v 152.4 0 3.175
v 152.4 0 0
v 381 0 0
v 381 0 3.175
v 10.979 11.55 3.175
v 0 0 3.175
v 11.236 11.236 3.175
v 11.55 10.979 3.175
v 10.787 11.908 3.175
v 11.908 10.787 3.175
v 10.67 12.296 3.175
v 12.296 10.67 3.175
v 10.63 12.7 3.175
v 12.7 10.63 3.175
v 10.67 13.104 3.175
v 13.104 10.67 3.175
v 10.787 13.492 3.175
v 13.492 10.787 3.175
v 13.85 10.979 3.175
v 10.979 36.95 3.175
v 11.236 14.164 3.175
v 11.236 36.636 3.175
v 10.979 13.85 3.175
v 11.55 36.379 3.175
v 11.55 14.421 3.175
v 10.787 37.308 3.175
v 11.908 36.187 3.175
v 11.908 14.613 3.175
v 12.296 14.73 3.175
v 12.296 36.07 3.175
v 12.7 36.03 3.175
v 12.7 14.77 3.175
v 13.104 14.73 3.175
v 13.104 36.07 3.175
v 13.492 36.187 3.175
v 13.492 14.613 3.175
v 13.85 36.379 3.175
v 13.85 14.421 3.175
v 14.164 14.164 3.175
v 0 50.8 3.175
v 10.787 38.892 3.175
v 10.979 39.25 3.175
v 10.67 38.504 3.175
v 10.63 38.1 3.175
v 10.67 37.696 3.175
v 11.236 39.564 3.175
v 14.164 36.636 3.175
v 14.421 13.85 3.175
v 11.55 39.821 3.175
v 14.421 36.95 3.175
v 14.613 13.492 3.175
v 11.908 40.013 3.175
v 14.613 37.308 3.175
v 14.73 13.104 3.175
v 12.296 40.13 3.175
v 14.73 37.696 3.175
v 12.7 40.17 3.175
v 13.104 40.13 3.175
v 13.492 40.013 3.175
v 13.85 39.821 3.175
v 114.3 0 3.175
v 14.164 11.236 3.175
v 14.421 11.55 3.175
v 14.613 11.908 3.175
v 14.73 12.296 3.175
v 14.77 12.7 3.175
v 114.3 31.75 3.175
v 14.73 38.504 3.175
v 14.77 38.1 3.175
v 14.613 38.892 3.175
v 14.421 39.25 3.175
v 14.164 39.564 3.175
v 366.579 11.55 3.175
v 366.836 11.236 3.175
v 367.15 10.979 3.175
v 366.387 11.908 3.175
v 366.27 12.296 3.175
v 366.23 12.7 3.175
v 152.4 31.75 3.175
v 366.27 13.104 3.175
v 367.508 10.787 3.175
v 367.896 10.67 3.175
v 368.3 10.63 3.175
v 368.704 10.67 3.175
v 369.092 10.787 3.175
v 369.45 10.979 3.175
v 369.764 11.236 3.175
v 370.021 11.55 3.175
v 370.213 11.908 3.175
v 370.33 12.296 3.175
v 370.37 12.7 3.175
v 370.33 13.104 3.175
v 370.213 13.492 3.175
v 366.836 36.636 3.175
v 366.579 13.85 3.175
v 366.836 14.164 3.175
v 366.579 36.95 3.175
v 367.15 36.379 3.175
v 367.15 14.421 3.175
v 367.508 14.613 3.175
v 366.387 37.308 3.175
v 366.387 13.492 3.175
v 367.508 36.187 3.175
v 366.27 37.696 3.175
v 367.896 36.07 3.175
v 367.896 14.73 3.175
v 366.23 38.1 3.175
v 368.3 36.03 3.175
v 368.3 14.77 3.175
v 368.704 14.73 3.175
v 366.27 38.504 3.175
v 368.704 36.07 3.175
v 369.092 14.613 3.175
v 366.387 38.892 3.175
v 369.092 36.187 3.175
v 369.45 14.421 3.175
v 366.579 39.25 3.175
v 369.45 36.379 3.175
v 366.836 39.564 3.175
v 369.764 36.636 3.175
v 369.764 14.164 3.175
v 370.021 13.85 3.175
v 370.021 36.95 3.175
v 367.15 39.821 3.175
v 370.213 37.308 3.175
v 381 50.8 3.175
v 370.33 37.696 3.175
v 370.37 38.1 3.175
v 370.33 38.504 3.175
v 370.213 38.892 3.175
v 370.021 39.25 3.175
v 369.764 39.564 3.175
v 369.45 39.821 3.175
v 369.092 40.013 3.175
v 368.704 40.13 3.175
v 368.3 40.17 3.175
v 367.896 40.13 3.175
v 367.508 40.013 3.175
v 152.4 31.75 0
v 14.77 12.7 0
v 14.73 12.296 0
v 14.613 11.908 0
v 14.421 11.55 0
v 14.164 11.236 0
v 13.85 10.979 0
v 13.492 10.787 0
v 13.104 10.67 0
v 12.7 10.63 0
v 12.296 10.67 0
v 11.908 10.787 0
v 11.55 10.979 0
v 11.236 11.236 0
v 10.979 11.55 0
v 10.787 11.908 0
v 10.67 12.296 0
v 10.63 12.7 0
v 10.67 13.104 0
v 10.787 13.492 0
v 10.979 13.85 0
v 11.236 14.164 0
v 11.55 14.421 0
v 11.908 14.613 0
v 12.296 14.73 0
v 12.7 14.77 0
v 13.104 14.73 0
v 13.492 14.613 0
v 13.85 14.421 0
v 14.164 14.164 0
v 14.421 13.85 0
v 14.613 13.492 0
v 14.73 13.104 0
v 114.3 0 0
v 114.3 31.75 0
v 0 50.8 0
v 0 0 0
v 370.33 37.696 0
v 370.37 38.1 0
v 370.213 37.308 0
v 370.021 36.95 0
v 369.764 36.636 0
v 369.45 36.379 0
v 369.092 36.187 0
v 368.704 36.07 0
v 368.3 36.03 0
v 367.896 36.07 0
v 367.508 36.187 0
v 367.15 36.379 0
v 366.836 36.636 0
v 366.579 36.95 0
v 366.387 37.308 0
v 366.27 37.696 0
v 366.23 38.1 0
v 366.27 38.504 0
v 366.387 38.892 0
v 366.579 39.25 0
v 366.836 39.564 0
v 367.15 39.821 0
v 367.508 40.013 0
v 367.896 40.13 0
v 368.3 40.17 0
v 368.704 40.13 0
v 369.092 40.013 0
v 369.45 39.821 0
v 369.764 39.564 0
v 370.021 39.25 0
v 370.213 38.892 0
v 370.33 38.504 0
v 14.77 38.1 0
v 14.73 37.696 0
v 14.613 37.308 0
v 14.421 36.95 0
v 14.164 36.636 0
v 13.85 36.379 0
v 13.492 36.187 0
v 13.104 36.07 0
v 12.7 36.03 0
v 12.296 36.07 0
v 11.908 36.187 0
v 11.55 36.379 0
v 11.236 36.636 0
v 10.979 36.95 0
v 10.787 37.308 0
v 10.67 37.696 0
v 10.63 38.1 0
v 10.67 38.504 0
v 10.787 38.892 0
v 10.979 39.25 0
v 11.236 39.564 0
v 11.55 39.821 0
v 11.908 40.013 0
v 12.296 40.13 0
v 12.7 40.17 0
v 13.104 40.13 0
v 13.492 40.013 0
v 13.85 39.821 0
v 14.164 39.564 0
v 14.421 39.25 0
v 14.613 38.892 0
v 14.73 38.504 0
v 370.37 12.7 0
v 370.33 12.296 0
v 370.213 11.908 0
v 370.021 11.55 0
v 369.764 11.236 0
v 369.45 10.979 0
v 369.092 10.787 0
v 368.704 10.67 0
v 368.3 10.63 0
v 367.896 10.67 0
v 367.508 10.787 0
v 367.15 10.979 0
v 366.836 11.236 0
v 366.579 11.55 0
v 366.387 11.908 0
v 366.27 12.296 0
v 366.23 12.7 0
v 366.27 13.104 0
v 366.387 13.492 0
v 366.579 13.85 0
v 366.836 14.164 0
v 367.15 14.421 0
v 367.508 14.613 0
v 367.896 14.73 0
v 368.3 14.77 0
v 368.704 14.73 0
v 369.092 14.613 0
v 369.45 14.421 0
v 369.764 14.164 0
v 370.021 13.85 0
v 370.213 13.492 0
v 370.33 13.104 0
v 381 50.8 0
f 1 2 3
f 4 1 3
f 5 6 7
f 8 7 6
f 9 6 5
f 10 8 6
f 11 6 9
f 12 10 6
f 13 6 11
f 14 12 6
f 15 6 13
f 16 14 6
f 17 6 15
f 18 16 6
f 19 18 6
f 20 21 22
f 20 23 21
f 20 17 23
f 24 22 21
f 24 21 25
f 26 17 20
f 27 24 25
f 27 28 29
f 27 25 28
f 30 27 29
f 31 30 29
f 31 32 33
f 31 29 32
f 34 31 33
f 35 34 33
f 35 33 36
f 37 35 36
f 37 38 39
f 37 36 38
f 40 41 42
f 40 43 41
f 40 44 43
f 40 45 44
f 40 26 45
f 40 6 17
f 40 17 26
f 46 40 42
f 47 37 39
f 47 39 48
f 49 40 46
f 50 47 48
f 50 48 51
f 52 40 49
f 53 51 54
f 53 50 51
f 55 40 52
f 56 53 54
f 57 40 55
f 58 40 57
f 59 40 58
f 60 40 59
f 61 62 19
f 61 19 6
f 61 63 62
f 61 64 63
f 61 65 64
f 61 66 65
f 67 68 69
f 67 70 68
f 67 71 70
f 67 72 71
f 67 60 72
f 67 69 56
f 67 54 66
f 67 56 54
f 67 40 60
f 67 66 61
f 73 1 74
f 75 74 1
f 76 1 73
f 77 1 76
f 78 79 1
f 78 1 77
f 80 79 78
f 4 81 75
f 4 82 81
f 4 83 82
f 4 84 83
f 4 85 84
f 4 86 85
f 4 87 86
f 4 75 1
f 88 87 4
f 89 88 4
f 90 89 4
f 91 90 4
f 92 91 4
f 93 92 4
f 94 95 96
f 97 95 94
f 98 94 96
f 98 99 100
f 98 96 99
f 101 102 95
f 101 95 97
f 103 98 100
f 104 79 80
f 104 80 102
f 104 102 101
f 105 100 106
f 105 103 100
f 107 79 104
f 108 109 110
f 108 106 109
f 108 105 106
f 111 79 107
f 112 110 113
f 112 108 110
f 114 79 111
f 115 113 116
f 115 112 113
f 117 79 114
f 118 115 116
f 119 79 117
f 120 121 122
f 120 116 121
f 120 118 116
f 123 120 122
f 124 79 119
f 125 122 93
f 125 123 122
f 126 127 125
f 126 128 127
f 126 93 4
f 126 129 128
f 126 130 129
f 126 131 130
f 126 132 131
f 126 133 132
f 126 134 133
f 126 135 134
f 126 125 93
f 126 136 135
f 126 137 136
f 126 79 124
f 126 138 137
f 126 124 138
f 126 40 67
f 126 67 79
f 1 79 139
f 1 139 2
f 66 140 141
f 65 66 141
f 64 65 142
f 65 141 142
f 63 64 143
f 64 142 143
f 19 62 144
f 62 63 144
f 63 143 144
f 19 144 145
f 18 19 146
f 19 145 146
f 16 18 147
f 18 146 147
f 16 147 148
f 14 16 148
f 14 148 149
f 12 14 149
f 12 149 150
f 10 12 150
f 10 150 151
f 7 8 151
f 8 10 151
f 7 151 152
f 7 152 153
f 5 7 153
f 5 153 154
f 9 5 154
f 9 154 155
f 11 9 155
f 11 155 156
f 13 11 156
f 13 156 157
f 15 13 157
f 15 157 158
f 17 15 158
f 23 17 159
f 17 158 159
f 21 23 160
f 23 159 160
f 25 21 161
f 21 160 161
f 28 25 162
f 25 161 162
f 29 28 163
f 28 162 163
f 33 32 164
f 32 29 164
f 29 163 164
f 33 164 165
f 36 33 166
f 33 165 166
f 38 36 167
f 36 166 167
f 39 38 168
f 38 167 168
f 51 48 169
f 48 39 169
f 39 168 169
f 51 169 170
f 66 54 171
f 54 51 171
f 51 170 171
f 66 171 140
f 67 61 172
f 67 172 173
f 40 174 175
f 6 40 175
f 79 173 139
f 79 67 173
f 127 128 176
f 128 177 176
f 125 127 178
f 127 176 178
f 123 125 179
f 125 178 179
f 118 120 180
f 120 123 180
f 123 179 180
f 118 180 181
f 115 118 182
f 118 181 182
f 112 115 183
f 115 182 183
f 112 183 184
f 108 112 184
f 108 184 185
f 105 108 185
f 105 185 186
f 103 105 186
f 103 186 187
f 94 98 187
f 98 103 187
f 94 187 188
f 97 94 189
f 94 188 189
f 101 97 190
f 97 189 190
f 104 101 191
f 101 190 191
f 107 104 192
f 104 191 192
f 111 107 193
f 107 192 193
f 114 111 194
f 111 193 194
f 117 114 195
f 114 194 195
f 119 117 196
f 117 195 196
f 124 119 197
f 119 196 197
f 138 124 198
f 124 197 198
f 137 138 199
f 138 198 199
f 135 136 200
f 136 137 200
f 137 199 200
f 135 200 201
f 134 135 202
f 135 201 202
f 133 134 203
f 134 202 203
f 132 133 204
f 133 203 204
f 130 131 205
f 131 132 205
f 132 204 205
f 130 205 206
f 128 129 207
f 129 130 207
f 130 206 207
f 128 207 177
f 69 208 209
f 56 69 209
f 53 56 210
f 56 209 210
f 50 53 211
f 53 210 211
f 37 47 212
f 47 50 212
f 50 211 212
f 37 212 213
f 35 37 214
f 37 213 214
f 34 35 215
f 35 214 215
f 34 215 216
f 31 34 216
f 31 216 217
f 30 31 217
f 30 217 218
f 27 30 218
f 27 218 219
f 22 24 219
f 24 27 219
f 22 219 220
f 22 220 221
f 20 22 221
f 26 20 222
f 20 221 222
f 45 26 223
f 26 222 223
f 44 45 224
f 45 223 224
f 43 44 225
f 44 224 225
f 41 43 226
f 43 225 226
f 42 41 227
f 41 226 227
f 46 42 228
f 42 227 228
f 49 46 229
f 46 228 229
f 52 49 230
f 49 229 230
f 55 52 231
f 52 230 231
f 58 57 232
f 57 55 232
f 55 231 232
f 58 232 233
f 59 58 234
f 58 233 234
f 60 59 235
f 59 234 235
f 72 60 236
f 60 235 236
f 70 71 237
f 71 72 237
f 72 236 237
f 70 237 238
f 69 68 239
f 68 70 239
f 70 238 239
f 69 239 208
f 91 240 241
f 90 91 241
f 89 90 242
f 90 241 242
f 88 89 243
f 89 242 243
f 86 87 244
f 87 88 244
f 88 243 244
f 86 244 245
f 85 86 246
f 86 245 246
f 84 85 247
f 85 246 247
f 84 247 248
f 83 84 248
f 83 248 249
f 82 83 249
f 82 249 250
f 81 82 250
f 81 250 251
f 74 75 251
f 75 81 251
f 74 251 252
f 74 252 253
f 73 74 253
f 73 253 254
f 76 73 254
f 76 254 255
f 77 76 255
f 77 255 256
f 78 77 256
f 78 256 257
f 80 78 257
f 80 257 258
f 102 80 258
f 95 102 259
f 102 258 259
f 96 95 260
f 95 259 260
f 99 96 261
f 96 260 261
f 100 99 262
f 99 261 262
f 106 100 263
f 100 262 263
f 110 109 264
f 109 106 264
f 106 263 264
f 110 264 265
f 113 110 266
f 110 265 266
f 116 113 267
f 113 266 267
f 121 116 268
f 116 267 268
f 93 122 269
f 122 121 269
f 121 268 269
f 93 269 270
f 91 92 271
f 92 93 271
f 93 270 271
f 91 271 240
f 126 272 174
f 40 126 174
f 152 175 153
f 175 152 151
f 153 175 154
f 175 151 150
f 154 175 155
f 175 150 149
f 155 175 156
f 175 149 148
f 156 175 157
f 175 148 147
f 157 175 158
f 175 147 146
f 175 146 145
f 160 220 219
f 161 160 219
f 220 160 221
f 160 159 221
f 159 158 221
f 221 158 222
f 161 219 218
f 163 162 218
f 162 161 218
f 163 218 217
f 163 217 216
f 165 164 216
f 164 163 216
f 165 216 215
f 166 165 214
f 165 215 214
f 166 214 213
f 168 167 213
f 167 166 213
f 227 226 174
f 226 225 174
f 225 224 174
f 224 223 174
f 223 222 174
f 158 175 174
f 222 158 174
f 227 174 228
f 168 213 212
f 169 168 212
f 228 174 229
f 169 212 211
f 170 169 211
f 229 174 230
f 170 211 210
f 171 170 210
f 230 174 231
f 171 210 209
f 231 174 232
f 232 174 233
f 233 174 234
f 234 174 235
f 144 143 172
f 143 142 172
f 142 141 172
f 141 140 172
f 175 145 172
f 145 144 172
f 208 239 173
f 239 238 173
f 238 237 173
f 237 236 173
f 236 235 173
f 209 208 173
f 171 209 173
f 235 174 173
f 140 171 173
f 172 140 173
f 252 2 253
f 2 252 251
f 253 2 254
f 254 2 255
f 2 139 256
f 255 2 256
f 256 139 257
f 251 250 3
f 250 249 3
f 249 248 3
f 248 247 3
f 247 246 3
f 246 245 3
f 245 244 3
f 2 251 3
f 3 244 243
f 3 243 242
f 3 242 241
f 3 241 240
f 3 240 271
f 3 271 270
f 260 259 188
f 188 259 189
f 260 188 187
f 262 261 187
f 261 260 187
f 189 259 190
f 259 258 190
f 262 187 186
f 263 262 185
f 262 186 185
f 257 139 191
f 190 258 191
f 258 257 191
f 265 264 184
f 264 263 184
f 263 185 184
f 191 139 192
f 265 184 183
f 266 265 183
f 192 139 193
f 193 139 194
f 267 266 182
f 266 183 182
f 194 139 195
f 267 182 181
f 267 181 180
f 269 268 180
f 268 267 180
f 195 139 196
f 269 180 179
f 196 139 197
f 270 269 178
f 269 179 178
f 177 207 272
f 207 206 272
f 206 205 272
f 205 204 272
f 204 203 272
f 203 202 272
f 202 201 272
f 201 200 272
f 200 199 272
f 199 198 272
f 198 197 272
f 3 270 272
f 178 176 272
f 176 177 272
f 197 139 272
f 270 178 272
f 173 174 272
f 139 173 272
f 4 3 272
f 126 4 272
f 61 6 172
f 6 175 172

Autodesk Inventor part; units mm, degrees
ref_plane "YZ Plane" through (0, 0, 0) normal (1, 0, 0) x (0, 1, 0)
ref_plane "XZ Plane" through (0, 0, 0) normal (0, 1, 0) x (-1, 0, 0)
ref_plane "XY Plane" through (0, 0, 0) normal (0, 0, 1) x (1, 0, 0)
sketch "Sketch1" plane through (0, 0, 0) normal (0, 0, 1) x (1, 0, 0)
  line L0 (0, 0) -> (381, 0)
  line L1 (381, 0) -> (381, 50.8)
  line L2 (381, 50.8) -> (0, 50.8)
  line L3 (0, 50.8) -> (0, 0)
  circle A0 centre (12.7, 12.7) radius 2.0701
  circle A1 centre (12.7, 38.1) radius 2.0701
  circle A2 centre (368.3, 12.7) radius 2.0701
  circle A3 centre (368.3, 38.1) radius 2.0701
  dimension "d0" = 50.8
  dimension "d1" = 381
  dimension "d2" = 4.1402
  dimension "d3" = 12.7
  dimension "d4" = 12.7
  dimension "d7" = 25.4
  dimension "d10" = 355.6
extrude "Extrusion1" add sketch "Sketch1" along normal blind 3.175
sketch "Sketch2" plane through (0, 0, 3.175) normal (0, 0, 1) x (1, 0, 0)
  line L0 (0, 0) -> (381, 0) projected
  line L1 (0, 50.8) -> (0, 0) projected
  line L2 (152.4, 0) -> (114.3, 0)
  line L3 (114.3, 0) -> (114.3, 31.75)
  line L4 (114.3, 31.75) -> (152.4, 31.75)
  line L5 (152.4, 31.75) -> (152.4, 0)
  dimension "d15" = 31.75
  dimension "d16" = 38.1
  dimension "d17" = 114.3
extrude "Extrusion2" cut sketch "Sketch2" against normal blind 25.4
properties part number "Polycarbonate Sheet" material "Polycarbonate, Clear"
